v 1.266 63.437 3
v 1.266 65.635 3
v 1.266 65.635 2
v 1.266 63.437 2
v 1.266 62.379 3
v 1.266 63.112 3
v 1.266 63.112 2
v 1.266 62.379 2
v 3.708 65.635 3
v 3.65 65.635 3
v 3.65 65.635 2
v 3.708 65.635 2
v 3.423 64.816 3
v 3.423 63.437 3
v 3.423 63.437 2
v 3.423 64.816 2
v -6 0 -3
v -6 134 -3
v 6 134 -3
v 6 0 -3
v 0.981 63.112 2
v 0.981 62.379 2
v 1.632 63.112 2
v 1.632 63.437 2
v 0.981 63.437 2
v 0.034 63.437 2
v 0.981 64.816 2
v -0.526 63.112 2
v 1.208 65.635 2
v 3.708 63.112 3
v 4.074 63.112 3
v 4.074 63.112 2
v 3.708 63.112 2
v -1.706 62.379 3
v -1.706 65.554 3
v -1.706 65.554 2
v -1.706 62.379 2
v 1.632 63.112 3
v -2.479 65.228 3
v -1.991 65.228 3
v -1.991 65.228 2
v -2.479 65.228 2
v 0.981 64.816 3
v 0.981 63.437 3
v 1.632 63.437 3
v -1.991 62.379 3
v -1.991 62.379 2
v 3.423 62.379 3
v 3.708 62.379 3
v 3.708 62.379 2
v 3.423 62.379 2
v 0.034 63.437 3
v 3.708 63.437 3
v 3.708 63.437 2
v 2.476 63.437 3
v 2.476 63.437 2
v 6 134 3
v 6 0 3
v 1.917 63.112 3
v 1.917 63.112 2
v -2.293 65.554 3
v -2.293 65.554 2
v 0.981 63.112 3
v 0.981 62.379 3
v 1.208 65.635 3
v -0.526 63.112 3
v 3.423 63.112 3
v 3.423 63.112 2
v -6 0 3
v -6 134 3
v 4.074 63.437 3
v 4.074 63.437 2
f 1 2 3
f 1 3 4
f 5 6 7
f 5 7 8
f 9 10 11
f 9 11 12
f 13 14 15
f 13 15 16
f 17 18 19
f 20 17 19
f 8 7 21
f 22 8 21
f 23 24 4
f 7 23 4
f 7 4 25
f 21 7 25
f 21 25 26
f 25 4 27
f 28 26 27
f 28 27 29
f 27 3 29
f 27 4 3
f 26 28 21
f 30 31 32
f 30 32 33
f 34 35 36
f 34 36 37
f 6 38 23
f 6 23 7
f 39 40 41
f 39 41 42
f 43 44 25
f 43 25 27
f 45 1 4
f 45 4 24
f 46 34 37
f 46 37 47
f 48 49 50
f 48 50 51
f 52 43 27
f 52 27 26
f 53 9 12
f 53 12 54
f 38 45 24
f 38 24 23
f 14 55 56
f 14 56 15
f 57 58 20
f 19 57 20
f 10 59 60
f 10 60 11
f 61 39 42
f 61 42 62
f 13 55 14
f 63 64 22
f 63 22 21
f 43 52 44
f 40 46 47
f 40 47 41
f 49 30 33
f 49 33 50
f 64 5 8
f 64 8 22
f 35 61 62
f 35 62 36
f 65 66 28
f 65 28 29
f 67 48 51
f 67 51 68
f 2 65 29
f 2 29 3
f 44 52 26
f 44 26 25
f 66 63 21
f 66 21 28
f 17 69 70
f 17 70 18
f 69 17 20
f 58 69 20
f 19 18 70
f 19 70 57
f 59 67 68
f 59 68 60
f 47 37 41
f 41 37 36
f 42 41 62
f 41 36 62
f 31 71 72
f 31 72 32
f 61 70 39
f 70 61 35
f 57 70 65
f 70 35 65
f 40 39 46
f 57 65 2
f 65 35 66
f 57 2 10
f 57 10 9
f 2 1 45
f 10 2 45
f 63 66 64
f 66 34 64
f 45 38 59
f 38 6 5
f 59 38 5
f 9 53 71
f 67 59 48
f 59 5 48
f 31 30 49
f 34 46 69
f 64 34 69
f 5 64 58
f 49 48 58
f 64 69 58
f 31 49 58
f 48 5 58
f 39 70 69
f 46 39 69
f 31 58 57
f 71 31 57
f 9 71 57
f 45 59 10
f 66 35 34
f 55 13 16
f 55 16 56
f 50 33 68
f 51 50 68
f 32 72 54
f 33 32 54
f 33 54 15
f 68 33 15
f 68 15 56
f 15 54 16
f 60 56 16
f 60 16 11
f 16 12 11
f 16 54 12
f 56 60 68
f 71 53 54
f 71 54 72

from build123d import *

# Parameters (mm, degrees)
SKETCH1_W           = 12
SKETCH1_H           = 6
BOSS_EXTRUDE1_DEPTH = 134
CUT_EXTRUDE1_DEPTH  = 1


with BuildPart() as part:
    # Sketch1 → Boss-Extrude1 (new body)
    with BuildSketch(Plane(origin=(0, 0, 0), x_dir=(1, 0, 0), z_dir=(0, 1, 0))):
        Rectangle(SKETCH1_W, SKETCH1_H)
    extrude(amount=BOSS_EXTRUDE1_DEPTH)

    # Sketch2 → Cut-Extrude1 (cut)
    # profile 1 of 3: a face of its own
    with BuildSketch(Plane.XY.offset(3)):
        Polygon((-2.293016974, 65.553906762), (-1.705972703, 65.553906762), (-1.705972703, 62.378906762), (-1.990908601, 62.378906762), (-1.990908601, 65.228265736), (-2.479370139, 65.228265736), align=None)
    # profile 2 of 3: a face of its own
    with BuildSketch(Plane.XY.offset(3)):
        Polygon((1.207624052, 65.635317018), (1.265501656, 65.635317018), (1.265501656, 63.437240095), (1.63184781, 63.437240095), (1.63184781, 63.111599069), (1.265501656, 63.111599069), (1.265501656, 62.378906762), (0.980565758, 62.378906762), (0.980565758, 63.111599069), (-0.525523985, 63.111599069), align=None)
        Polygon((0.980565758, 63.437240095), (0.980565758, 64.816126313), (0.034171528, 63.437240095), align=None, mode=Mode.SUBTRACT)
    # profile 3 of 3: a face of its own
    with BuildSketch(Plane.XY.offset(3)):
        Polygon((3.649931744, 65.635317018), (3.707809348, 65.635317018), (3.707809348, 63.437240095), (4.074155502, 63.437240095), (4.074155502, 63.111599069), (3.707809348, 63.111599069), (3.707809348, 62.378906762), (3.422873451, 62.378906762), (3.422873451, 63.111599069), (1.916783707, 63.111599069), align=None)
        Polygon((3.422873451, 63.437240095), (3.422873451, 64.816126313), (2.47647922, 63.437240095), align=None, mode=Mode.SUBTRACT)
    extrude(amount=-CUT_EXTRUDE1_DEPTH, mode=Mode.SUBTRACT)


solid = part.part
